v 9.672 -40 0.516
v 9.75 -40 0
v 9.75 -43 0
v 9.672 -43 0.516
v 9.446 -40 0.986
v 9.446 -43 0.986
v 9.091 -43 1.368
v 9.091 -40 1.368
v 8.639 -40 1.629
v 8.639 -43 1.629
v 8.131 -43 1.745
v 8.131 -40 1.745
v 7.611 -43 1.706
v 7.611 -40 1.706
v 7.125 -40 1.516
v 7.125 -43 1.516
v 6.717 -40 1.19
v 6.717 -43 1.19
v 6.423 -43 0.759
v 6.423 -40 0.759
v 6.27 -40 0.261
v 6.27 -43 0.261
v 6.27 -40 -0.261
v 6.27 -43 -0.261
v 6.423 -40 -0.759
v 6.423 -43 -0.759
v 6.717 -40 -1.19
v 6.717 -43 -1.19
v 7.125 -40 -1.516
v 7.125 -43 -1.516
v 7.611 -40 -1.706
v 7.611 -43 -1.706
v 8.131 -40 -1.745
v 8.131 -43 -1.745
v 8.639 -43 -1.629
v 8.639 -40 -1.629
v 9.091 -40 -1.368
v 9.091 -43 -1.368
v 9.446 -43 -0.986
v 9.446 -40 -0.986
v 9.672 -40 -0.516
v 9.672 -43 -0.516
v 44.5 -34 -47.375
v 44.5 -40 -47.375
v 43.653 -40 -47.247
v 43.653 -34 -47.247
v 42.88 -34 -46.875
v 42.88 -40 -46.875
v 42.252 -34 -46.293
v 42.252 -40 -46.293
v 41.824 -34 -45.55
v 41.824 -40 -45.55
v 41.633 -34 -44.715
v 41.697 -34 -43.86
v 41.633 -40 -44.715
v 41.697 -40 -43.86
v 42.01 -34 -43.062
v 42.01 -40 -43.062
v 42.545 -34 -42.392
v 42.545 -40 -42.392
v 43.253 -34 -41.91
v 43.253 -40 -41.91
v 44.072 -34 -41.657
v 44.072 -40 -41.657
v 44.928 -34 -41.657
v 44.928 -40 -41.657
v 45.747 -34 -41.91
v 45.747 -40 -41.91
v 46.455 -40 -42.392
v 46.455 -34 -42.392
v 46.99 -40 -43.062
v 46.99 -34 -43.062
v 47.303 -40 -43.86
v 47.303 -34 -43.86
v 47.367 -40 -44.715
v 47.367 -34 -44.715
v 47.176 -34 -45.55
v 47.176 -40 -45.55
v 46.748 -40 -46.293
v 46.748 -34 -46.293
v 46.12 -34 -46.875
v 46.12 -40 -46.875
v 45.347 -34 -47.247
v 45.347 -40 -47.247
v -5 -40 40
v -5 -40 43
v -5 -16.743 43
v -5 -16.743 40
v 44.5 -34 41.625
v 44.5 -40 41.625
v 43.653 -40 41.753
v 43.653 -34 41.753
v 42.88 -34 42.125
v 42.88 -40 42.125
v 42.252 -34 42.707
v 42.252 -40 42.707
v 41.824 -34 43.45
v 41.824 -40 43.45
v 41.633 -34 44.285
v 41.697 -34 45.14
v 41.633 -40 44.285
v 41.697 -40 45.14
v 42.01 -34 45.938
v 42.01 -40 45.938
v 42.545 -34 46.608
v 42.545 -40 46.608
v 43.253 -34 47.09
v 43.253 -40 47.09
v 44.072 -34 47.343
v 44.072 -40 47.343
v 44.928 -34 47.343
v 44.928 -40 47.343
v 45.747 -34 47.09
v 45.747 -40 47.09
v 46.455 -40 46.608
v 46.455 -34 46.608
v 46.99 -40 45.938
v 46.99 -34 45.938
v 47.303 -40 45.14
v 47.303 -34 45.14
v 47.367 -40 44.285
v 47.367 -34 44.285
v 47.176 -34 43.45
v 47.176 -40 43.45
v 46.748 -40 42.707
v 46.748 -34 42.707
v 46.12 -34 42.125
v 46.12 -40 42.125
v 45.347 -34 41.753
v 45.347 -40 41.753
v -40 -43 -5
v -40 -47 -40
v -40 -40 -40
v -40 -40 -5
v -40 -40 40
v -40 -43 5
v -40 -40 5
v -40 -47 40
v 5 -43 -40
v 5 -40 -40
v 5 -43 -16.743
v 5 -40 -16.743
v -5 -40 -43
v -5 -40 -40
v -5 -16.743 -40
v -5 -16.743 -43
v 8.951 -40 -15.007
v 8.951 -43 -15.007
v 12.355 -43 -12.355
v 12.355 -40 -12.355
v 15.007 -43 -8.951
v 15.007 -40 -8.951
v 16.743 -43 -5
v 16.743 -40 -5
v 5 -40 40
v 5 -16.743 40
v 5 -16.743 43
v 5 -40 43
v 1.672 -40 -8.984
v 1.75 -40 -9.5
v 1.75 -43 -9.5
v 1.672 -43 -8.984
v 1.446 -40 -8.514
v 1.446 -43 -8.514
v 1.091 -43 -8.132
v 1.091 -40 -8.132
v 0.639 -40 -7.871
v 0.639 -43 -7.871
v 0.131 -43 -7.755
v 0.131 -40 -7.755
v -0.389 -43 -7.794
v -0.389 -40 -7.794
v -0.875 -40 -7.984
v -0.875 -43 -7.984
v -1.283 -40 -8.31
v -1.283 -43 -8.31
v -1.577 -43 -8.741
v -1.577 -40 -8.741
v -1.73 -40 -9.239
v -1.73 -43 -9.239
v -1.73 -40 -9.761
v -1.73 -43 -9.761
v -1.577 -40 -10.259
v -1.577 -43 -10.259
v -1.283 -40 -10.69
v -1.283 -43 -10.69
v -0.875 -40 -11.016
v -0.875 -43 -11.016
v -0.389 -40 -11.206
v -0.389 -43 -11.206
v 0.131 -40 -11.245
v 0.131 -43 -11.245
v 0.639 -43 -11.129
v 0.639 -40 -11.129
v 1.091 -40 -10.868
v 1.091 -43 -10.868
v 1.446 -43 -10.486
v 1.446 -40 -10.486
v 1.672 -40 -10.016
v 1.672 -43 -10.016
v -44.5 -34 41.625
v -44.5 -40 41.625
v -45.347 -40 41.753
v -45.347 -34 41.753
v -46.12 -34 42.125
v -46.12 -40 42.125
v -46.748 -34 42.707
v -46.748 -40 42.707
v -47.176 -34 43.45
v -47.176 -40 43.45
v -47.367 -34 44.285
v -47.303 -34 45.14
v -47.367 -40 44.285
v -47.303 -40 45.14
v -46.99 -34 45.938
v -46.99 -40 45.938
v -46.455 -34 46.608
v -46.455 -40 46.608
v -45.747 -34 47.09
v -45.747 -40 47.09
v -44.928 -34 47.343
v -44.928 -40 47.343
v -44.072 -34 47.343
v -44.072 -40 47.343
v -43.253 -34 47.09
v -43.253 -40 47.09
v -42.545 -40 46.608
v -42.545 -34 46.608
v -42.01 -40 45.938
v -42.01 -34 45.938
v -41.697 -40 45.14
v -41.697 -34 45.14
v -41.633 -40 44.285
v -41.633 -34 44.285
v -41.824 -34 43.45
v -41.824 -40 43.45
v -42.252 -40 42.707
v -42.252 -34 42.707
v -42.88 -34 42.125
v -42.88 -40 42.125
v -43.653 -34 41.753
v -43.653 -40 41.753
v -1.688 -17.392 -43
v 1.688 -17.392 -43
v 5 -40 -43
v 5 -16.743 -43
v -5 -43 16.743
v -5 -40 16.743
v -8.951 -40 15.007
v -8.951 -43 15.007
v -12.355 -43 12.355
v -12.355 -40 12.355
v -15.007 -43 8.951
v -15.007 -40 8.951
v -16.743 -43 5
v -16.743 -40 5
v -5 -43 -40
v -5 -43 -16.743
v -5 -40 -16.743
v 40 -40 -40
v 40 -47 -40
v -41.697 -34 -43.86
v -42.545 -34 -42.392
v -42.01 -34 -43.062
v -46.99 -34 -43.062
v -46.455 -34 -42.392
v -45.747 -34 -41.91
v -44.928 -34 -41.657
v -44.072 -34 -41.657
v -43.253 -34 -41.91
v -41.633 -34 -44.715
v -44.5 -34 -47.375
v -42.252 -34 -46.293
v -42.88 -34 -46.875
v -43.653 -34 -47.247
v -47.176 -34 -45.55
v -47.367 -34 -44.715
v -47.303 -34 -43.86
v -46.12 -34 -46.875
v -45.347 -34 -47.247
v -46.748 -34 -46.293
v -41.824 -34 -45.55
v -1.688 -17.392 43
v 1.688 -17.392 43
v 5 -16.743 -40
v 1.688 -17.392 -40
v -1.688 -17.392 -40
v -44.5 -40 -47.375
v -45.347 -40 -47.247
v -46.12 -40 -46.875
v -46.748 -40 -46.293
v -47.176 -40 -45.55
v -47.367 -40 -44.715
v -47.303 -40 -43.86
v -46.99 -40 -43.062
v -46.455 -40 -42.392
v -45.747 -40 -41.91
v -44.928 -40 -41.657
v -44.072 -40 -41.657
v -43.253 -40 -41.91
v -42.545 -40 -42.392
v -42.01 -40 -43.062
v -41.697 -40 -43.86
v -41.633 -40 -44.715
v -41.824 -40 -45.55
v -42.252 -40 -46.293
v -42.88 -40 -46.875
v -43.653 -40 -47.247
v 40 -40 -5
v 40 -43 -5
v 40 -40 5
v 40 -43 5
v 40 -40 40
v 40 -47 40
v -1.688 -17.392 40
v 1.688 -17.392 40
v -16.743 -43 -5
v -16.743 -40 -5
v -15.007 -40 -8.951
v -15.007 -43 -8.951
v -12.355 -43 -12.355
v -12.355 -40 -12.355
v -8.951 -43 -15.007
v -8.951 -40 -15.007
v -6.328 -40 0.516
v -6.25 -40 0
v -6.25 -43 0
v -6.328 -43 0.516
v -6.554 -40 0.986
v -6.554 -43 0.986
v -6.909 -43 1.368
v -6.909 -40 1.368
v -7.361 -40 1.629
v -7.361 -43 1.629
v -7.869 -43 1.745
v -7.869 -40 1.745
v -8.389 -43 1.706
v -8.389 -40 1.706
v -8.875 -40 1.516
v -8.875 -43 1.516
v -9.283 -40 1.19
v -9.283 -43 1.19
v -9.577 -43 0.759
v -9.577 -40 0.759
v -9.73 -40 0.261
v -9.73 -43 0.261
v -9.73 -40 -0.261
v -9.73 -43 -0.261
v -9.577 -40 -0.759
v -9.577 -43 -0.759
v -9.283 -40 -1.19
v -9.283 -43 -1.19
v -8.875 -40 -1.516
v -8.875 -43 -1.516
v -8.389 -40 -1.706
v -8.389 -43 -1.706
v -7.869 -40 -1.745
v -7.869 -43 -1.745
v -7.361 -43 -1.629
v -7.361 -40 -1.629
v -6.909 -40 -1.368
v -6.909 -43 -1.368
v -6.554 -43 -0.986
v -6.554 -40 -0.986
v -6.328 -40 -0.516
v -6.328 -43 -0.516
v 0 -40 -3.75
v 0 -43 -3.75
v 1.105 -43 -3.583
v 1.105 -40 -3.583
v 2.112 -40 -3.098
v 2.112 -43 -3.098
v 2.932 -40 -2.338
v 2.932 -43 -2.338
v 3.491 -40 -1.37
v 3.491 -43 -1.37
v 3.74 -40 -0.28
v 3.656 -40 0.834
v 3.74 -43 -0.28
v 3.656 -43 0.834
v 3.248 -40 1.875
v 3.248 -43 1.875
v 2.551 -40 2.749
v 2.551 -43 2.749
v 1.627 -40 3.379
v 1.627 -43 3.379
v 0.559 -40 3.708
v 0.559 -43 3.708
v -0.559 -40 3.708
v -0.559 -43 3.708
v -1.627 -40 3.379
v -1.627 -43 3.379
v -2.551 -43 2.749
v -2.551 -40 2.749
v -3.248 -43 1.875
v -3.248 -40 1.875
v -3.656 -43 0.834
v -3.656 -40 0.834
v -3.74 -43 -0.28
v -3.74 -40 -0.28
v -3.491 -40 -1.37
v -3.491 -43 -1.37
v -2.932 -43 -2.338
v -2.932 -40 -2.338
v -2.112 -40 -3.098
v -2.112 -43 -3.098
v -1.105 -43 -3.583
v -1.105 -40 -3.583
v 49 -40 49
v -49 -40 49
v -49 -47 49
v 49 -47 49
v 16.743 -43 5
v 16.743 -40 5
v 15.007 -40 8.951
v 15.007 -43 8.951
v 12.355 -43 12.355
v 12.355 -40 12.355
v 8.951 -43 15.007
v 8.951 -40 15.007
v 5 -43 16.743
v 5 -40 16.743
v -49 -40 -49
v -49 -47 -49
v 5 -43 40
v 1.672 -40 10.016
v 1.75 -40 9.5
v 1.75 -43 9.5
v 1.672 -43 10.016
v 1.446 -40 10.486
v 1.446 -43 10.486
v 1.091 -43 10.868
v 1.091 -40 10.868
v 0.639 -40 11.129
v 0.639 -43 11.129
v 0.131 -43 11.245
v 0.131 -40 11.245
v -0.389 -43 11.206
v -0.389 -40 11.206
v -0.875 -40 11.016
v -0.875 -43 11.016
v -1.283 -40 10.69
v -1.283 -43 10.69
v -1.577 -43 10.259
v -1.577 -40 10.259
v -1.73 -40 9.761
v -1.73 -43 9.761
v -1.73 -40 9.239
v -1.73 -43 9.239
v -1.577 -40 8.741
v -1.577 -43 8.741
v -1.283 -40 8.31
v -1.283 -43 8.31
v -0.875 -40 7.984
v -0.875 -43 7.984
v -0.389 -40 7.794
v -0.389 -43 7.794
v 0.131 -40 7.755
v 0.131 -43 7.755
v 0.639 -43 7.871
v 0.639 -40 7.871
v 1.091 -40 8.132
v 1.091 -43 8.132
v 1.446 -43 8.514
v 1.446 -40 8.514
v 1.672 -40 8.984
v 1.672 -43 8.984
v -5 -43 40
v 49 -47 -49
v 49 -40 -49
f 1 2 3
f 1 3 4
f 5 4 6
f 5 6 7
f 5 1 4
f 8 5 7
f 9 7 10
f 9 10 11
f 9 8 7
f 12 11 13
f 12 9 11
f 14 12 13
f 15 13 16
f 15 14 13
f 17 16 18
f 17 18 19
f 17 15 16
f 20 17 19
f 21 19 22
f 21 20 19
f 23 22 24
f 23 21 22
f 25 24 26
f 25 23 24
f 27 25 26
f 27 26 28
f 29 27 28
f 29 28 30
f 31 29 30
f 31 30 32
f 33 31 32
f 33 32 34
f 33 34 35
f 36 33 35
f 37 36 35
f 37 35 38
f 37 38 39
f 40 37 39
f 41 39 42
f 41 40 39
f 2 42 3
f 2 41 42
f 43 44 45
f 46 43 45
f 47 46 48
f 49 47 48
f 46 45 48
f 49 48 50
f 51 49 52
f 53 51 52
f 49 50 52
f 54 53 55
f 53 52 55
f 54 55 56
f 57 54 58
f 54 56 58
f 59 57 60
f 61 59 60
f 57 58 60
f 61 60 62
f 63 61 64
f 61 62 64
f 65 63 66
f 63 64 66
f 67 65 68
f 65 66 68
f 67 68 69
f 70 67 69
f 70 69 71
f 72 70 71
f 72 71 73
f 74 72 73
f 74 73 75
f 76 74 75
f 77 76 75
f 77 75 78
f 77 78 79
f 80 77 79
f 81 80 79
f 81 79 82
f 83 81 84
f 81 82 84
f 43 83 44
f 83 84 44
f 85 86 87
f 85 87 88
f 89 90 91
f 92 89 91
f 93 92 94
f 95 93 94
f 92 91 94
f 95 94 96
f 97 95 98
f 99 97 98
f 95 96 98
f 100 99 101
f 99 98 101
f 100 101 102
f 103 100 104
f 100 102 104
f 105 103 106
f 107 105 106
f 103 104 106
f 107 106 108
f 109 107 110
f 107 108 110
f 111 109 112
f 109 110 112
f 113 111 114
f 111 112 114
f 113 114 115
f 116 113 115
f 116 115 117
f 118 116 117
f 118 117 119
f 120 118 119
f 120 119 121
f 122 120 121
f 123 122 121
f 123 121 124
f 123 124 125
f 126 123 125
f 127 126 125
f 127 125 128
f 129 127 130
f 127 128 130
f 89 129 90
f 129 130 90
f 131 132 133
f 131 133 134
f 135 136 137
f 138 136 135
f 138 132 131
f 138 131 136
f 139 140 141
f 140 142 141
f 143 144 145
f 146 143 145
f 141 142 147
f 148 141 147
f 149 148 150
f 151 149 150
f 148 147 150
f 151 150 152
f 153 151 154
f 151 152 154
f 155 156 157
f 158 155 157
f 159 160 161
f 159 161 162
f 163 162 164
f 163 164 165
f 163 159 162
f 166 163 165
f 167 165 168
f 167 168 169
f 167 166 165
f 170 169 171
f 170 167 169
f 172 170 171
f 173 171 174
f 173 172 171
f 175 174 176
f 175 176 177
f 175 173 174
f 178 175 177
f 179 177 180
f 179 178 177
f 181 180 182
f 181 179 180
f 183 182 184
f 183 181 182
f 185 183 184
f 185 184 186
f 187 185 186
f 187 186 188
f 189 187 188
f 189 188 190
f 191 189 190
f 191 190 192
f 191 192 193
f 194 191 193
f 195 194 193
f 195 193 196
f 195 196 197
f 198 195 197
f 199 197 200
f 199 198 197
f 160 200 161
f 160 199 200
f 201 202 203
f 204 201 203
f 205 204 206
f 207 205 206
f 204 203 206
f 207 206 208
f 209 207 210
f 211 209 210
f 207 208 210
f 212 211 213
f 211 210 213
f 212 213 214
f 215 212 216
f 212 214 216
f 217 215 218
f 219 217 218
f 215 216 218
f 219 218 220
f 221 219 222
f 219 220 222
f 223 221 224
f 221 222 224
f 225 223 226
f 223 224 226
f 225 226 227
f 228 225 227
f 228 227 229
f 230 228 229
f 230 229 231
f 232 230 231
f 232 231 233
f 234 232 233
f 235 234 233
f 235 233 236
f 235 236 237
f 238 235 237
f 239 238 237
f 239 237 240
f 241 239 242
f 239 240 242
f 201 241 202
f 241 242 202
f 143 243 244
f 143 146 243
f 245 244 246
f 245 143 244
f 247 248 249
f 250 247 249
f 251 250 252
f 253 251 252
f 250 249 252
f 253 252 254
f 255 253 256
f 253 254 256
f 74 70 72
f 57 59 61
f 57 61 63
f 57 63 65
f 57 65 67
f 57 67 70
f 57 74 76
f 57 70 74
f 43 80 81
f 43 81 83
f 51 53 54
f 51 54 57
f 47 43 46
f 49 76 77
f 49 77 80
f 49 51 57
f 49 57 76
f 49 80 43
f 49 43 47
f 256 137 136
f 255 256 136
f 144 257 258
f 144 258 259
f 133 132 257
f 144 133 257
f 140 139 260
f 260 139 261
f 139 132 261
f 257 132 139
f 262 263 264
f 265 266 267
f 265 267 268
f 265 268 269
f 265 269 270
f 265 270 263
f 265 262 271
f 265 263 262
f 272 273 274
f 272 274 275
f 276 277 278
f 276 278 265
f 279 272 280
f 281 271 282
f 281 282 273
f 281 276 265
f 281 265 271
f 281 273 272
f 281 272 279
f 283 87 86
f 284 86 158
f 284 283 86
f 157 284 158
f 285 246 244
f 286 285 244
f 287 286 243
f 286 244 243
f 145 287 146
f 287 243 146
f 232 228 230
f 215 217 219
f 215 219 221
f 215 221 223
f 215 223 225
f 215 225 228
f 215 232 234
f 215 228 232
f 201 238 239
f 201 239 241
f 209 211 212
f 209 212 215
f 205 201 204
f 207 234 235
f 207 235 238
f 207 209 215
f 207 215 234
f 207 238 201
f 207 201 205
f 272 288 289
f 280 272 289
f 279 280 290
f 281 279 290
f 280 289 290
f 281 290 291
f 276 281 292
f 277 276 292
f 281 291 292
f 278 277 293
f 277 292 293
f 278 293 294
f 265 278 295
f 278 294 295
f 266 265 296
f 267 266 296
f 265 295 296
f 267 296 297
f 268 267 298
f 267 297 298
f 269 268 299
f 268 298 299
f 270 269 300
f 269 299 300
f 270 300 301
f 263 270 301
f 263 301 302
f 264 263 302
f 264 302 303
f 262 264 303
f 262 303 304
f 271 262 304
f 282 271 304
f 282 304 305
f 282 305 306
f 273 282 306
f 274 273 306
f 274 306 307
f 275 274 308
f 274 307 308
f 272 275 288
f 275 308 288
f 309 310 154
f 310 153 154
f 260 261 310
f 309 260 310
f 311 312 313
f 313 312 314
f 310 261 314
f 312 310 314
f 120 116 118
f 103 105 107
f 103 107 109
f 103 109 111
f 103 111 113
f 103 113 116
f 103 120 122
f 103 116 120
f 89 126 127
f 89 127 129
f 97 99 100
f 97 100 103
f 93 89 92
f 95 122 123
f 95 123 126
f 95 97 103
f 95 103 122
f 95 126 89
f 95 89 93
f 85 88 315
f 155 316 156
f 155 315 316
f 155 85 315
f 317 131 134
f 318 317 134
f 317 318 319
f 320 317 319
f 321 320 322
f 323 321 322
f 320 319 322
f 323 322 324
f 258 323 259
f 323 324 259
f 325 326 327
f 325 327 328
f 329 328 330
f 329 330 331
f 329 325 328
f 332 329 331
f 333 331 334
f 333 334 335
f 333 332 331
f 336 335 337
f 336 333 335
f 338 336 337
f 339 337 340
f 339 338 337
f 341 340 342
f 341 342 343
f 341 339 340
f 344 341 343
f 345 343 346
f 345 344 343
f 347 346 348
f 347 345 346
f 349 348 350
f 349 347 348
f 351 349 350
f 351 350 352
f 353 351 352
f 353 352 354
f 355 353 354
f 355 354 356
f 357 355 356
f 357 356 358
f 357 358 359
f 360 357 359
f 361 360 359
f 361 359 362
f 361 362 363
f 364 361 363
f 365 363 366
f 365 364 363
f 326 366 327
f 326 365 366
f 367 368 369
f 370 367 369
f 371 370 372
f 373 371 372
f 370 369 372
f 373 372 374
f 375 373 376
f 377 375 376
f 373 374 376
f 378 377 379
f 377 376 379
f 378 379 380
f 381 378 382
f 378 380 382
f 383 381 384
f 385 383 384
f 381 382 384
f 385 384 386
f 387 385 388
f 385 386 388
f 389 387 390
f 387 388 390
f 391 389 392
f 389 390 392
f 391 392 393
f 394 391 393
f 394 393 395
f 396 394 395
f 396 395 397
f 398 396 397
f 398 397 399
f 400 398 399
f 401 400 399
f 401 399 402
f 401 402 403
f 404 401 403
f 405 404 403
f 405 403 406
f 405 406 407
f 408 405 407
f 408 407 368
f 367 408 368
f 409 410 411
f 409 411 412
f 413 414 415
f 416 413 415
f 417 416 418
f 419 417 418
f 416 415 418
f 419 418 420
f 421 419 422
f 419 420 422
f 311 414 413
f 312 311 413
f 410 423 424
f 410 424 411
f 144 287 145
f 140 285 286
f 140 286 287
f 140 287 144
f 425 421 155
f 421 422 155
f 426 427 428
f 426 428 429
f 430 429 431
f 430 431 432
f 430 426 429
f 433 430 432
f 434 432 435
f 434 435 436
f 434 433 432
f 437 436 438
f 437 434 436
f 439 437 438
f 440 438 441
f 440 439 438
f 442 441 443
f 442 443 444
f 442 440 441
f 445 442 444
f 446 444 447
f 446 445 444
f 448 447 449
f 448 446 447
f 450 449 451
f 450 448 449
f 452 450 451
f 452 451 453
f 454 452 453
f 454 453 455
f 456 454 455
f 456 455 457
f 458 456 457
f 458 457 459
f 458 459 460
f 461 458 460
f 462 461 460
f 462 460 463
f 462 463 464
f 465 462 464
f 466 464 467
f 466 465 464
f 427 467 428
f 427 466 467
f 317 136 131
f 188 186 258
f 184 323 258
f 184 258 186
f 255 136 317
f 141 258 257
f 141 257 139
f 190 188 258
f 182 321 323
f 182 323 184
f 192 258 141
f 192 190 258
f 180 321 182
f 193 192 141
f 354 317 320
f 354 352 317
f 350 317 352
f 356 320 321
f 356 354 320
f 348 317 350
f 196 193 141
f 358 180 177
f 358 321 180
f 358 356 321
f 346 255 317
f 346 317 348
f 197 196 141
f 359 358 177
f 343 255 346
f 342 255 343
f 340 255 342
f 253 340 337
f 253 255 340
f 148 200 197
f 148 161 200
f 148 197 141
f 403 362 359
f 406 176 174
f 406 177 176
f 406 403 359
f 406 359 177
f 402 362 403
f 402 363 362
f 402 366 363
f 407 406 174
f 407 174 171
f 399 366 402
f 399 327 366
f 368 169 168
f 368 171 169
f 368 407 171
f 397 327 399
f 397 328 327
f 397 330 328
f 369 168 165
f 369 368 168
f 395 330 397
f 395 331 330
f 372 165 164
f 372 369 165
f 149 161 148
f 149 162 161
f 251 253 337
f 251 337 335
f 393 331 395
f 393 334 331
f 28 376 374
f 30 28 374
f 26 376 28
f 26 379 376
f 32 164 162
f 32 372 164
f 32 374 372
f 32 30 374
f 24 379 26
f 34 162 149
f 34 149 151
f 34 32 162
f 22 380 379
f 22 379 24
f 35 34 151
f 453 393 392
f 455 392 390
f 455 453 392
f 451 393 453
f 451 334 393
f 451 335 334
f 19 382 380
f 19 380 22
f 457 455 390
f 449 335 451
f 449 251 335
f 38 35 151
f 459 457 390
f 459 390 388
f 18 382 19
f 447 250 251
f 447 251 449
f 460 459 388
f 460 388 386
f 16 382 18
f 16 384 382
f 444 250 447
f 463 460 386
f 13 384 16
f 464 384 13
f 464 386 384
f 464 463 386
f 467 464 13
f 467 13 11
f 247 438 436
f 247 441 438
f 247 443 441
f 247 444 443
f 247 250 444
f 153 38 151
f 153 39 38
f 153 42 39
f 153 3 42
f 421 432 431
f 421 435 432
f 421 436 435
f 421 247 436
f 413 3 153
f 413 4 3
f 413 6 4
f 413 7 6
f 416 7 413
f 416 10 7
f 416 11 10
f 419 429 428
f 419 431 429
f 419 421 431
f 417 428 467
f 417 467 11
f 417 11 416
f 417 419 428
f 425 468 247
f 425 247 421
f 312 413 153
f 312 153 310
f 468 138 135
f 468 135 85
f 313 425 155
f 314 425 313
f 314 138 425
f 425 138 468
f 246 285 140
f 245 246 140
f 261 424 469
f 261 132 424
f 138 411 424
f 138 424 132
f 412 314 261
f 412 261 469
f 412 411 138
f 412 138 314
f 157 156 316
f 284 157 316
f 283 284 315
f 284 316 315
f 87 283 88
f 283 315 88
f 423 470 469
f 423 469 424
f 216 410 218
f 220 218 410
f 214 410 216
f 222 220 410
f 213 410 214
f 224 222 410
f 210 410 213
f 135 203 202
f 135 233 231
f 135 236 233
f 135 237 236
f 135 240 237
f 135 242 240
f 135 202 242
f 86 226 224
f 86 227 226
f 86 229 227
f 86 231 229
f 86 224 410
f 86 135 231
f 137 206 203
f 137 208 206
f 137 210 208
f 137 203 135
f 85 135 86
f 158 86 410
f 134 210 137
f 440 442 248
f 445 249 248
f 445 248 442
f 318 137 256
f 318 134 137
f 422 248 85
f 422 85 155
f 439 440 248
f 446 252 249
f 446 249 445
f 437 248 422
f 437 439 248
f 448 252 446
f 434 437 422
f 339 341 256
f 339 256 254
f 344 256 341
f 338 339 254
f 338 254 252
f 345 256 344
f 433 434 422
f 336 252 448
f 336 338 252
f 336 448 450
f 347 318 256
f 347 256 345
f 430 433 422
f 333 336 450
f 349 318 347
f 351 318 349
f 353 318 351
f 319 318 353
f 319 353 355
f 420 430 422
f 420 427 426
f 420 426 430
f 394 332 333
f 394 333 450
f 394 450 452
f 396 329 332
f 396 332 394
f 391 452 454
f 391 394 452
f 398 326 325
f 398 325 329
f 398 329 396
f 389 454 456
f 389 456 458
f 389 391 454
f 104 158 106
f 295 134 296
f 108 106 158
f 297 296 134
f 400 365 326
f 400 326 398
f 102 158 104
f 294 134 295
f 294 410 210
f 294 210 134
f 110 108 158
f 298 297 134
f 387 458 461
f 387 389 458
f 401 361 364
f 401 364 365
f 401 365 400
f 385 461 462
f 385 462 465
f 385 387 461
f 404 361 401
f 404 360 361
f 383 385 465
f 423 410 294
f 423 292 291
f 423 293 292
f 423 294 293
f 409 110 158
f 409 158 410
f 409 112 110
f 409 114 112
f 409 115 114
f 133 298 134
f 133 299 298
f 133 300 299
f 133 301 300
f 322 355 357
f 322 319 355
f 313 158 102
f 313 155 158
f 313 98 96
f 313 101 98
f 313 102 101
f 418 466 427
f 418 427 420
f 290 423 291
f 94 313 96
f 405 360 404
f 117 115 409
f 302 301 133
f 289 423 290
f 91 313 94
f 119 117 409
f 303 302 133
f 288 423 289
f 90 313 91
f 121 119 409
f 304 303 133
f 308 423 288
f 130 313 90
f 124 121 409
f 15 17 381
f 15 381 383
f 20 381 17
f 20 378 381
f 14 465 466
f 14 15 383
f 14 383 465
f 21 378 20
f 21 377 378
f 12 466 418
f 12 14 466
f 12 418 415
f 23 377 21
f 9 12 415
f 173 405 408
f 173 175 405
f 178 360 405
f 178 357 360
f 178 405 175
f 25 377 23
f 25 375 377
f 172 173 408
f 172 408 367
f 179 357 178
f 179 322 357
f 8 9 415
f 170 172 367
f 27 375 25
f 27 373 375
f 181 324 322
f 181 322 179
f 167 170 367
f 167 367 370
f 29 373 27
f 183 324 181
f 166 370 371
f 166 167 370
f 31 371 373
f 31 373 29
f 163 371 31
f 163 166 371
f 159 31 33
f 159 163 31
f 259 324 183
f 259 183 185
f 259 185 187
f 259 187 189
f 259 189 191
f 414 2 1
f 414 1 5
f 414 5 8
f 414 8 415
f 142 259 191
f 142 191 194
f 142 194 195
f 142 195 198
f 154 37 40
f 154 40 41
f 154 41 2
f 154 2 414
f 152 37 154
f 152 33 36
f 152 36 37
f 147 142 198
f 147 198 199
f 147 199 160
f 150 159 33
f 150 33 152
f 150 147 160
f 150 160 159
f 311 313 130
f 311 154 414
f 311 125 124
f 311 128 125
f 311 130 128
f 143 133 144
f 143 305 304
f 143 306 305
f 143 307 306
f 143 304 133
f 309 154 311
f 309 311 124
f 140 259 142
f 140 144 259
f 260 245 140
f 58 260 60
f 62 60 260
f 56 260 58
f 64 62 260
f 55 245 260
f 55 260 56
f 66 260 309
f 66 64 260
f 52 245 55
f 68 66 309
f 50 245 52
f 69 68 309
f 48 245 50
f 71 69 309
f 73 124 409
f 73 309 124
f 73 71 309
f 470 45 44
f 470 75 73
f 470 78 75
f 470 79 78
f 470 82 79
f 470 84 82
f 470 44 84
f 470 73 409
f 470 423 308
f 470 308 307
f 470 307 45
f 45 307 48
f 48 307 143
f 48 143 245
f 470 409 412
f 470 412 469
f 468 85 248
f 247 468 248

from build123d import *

# Parameters (mm, degrees)
SKETCH2_R                  = 1.75
SKETCH2_W                  = 10
SKETCH2_H                  = 10
BOSS_EXTRUDE1_DEPTH        = 3
CIRPATTERN1_COUNT          = 4
CIRPATTERN2_START          = 40
CIRPATTERN2_OUTLINE_R      = 1.75
CIRPATTERN2_DEPTH          = 3
CIRPATTERN2_START_2        = -43
CIRPATTERN2_2_OUTLINE_R    = 1.75
CIRPATTERN2_2_DEPTH        = 3
CIRPATTERN2_3_OUTLINE_R    = 1.75
CIRPATTERN2_3_DEPTH        = 3
CIRPATTERN2_4_OUTLINE_R    = 1.75
CIRPATTERN2_4_DEPTH        = 3
BOSS_EXTRUDE2_DEPTH        = 50
BOSS_EXTRUDE2_DEPTH_BACK   = 50
SKETCH3_W                  = 10
SKETCH3_H                  = 10
BOSS_EXTRUDE2_2_DEPTH      = 50
BOSS_EXTRUDE2_2_DEPTH_BACK = 50
BOSS_EXTRUDE2_3_DEPTH      = 50
BOSS_EXTRUDE2_3_DEPTH_BACK = 50
BOSS_EXTRUDE2_4_DEPTH      = 50
BOSS_EXTRUDE2_4_DEPTH_BACK = 50
SKETCH4_W                  = 100
SKETCH4_H                  = 100
SKETCH4_W_2                = 80
SKETCH4_H_2                = 80
BOSS_EXTRUDE3_DEPTH        = 10
SKETCH5_W                  = 100
SKETCH5_H                  = 100
SKETCH5_W_2                = 80
SKETCH5_H_2                = 80
BOSS_EXTRUDE4_DEPTH        = 5
CUT_EXTRUDE1_START         = -100
CUT_EXTRUDE1_DEPTH         = 100
CUT_EXTRUDE1_START_2       = -55
CUT_EXTRUDE1_2_OUTLINE_W   = 10
CUT_EXTRUDE1_2_OUTLINE_H   = 3
CUT_EXTRUDE1_2_DEPTH       = 10
CUT_EXTRUDE1_3_OUTLINE_W   = 90
CUT_EXTRUDE1_3_OUTLINE_H   = 3
CUT_EXTRUDE1_3_DEPTH       = 100
SKETCH7_R                  = 3.75
CUT_EXTRUDE2_DEPTH         = 10
SKETCH8_R                  = 3.75
CUT_EXTRUDE3_DEPTH         = 117.828934772
SKETCH9_R                  = 3.75
CUT_EXTRUDE4_DEPTH         = 117.828934772
SKETCH10_W                 = 100
SKETCH10_H                 = 100
CUT_EXTRUDE5_DEPTH         = 3
CUT_EXTRUDE6_DEPTH         = 1
SKETCH12_W                 = 99
SKETCH12_H                 = 97
CUT_EXTRUDE7_DEPTH         = 1
CUT_EXTRUDE8_DEPTH         = 1
SKETCH14_W                 = 98
SKETCH14_H                 = 97
CUT_EXTRUDE9_DEPTH         = 1
CUT_EXTRUDE10_DEPTH        = 117.404467268
CUT_EXTRUDE10_DEPTH_BACK   = 117.404467268
SKETCH15_W                 = 9
SKETCH15_H                 = 5
SKETCH16_R                 = 3.125
CUT_EXTRUDE11_DEPTH        = 8
SKETCH18_W                 = 98
SKETCH18_H                 = 98
SKETCH18_W_2               = 33.4851887
SKETCH18_H_2               = 3
CUT_EXTRUDE12_DEPTH        = 85
SKETCH20_R                 = 2.875
BOSS_EXTRUDE5_DEPTH        = 6
SKETCH21_R                 = 1.75
SKETCH21_R_2               = 3.75
CUT_EXTRUDE13_DEPTH        = 115.341593482


with BuildPart() as part:
    # Sketch2 → Boss-Extrude1 (new body)
    # profile 1 of 13: a face of its own
    with BuildSketch(Plane.XY.offset(40)):
        with BuildLine():
            ThreePointArc((5, -16.74259435), (0, -17.47325), (-5, -16.74259435))
            Line((-5, -16.74259435), (-5, -50))
            Line((-5, -50), (5, -50))
            Line((5, -50), (5, -16.74259435))
        make_face()
    # profile 2 of 13: a face of its own
    with BuildSketch(Plane.XY.offset(40)):
        with BuildLine():
            Line((5, -5), (-5, -5))
            Line((-5, -5), (-5, -16.74259435))
            ThreePointArc((-5, -16.74259435), (0, -17.47325), (5, -16.74259435))
            Line((5, -16.74259435), (5, -5))
        make_face()
        with Locations((0, -9.5)):
            Circle(SKETCH2_R, mode=Mode.SUBTRACT)
    # profile 3 of 13: a face of its own
    with BuildSketch(Plane.XY.offset(40)):
        with BuildLine():
            Line((16.74259435, -5), (5, -5))
            Line((5, -5), (5, -16.74259435))
            ThreePointArc((5, -16.74259435), (12.355453564, -12.355453564), (16.74259435, -5))
        make_face()
    # profile 4 of 13: a face of its own
    with BuildSketch(Plane.XY.offset(40)):
        with BuildLine():
            Line((5, 5), (5, -5))
            Line((5, -5), (16.74259435, -5))
            ThreePointArc((16.74259435, -5), (17.289621197, -2.526551883), (17.47325, 0))
            ThreePointArc((17.47325, 0), (17.289621197, 2.526551883), (16.74259435, 5))
            Line((16.74259435, 5), (5, 5))
        make_face()
        with Locations((8, 0)):
            Circle(SKETCH2_R, mode=Mode.SUBTRACT)
    # profile 5 of 13: a face of its own
    with BuildSketch(Plane.XY.offset(40)):
        Rectangle(SKETCH2_W, SKETCH2_H)
    # profile 6 of 13: a face of its own
    with BuildSketch(Plane.XY.offset(40)):
        with BuildLine():
            Line((-5, -5), (-16.74259435, -5))
            ThreePointArc((-16.74259435, -5), (-12.355453564, -12.355453564), (-5, -16.74259435))
            Line((-5, -16.74259435), (-5, -5))
        make_face()
    # profile 7 of 13: a face of its own
    with BuildSketch(Plane.XY.offset(40)):
        with BuildLine():
            ThreePointArc((-16.74259435, 5), (-17.47325, 0), (-16.74259435, -5))
            Line((-16.74259435, -5), (-5, -5))
            Line((-5, -5), (-5, 5))
            Line((-5, 5), (-16.74259435, 5))
        make_face()
        with Locations((-8, 0)):
            Circle(SKETCH2_R, mode=Mode.SUBTRACT)
    # profile 8 of 13: a face of its own
    with BuildSketch(Plane.XY.offset(40)):
        with BuildLine():
            ThreePointArc((-5, 16.74259435), (-12.355453564, 12.355453564), (-16.74259435, 5))
            Line((-16.74259435, 5), (-5, 5))
            Line((-5, 5), (-5, 16.74259435))
        make_face()
    # profile 9 of 13: a face of its own
    with BuildSketch(Plane.XY.offset(40)):
        with BuildLine():
            Line((-5, 16.74259435), (-5, 5))
            Line((-5, 5), (5, 5))
            Line((5, 5), (5, 16.74259435))
            ThreePointArc((5, 16.74259435), (0, 17.47325), (-5, 16.74259435))
        make_face()
        with Locations((0, 9.5)):
            Circle(SKETCH2_R, mode=Mode.SUBTRACT)
    # profile 10 of 13: a face of its own
    with BuildSketch(Plane.XY.offset(40)):
        with BuildLine():
            Line((5, 16.74259435), (5, 5))
            Line((5, 5), (16.74259435, 5))
            ThreePointArc((16.74259435, 5), (12.355453564, 12.355453564), (5, 16.74259435))
        make_face()
    # profile 11 of 13: a face of its own
    with BuildSketch(Plane.XY.offset(40)):
        with BuildLine():
            ThreePointArc((17.47325, 0), (17.289621197, -2.526551883), (16.74259435, -5))
            Line((16.74259435, -5), (50, -5))
            Line((50, -5), (50, 5))
            Line((50, 5), (16.74259435, 5))
            ThreePointArc((16.74259435, 5), (17.289621197, 2.526551883), (17.47325, 0))
        make_face()
    # profile 12 of 13: a face of its own
    with BuildSketch(Plane.XY.offset(40)):
        with BuildLine():
            Line((-50, 5), (-50, -5))
            Line((-50, -5), (-16.74259435, -5))
            ThreePointArc((-16.74259435, -5), (-17.47325, 0), (-16.74259435, 5))
            Line((-16.74259435, 5), (-50, 5))
        make_face()
    # profile 13 of 13: a face of its own
    with BuildSketch(Plane.XY.offset(40)):
        with BuildLine():
            Line((-5, 50), (-5, 16.74259435))
            ThreePointArc((-5, 16.74259435), (0, 17.47325), (5, 16.74259435))
            Line((5, 16.74259435), (5, 50))
            Line((5, 50), (-5, 50))
        make_face()
    extrude(amount=BOSS_EXTRUDE1_DEPTH)


with BuildPart() as cirpattern1_1:
    # CirPattern1: pattern copy
    add(part.part.rotate(Axis((0, 0, 0), (1, 0, 0)), 1 * 360 / CIRPATTERN1_COUNT))


with BuildPart() as cirpattern1_2:
    # CirPattern1: pattern copy
    add(part.part.rotate(Axis((0, 0, 0), (1, 0, 0)), 2 * 360 / CIRPATTERN1_COUNT))


with BuildPart() as cirpattern1_3:
    # CirPattern1: pattern copy
    add(part.part.rotate(Axis((0, 0, 0), (1, 0, 0)), 3 * 360 / CIRPATTERN1_COUNT))

    # Cut-Extrude1 3 outline → Cut-Extrude1 3 (cut)
    with BuildSketch(Plane.ZY.offset(50).offset(CUT_EXTRUDE1_START)):
        with Locations((5, 41.5)):
            Rectangle(CUT_EXTRUDE1_3_OUTLINE_W, CUT_EXTRUDE1_3_OUTLINE_H)
    extrude(amount=CUT_EXTRUDE1_3_DEPTH, mode=Mode.SUBTRACT)


with BuildPart() as body_5:
    # CirPattern2: read off the stored shape, not the designer's step
    # CirPattern2 outline → CirPattern2 (new body)
    with BuildSketch(Plane.XY.offset(CIRPATTERN2_START)):
        with BuildLine():
            ThreePointArc((5, -16.74259435), (12.355453564, -12.355453564), (16.74259435, -5))
            Line((16.74259435, -5), (50, -5))
            Line((50, -5), (50, 5))
            Line((50, 5), (16.74259435, 5))
            ThreePointArc((16.74259435, 5), (12.355453564, 12.355453564), (5, 16.74259435))
            Line((5, 16.74259435), (5, 50))
            Line((5, 50), (-5, 50))
            Line((-5, 50), (-5, 16.74259435))
            ThreePointArc((-5, 16.74259435), (-12.355453564, 12.355453564), (-16.74259435, 5))
            Line((-16.74259435, 5), (-50, 5))
            Line((-50, 5), (-50, -5))
            Line((-50, -5), (-16.74259435, -5))
            ThreePointArc((-16.74259435, -5), (-12.355453564, -12.355453564), (-5, -16.74259435))
            Line((-5, -16.74259435), (-5, -50))
            Line((-5, -50), (5, -50))
            Line((5, -50), (5, -16.74259435))
        make_face()
        with Locations((0, -9.5)):
            Circle(CIRPATTERN2_OUTLINE_R, mode=Mode.SUBTRACT)
        with Locations((-8, 0)):
            Circle(CIRPATTERN2_OUTLINE_R, mode=Mode.SUBTRACT)
        with Locations((8, 0)):
            Circle(CIRPATTERN2_OUTLINE_R, mode=Mode.SUBTRACT)
        with Locations((0, 9.5)):
            Circle(CIRPATTERN2_OUTLINE_R, mode=Mode.SUBTRACT)
    extrude(amount=CIRPATTERN2_DEPTH)


with BuildPart() as body_6:
    # CirPattern2 2 outline → CirPattern2 2 (new body)
    with BuildSketch(Plane.YZ.offset(CIRPATTERN2_START_2)):
        with BuildLine():
            Line((-5, 50), (-5, 16.74259435))
            ThreePointArc((-5, 16.74259435), (-12.355453564, 12.355453564), (-16.74259435, 5))
            Line((-16.74259435, 5), (-50, 5))
            Line((-50, 5), (-50, -5))
            Line((-50, -5), (-16.74259435, -5))
            ThreePointArc((-16.74259435, -5), (-12.355453564, -12.355453564), (-5, -16.74259435))
            Line((-5, -16.74259435), (-5, -50))
            Line((-5, -50), (5, -50))
            Line((5, -50), (5, -16.74259435))
            ThreePointArc((5, -16.74259435), (12.355453564, -12.355453564), (16.74259435, -5))
            Line((16.74259435, -5), (50, -5))
            Line((50, -5), (50, 5))
            Line((50, 5), (16.74259435, 5))
            ThreePointArc((16.74259435, 5), (12.355453564, 12.355453564), (5, 16.74259435))
            Line((5, 16.74259435), (5, 50))
            Line((5, 50), (-5, 50))
        make_face()
        with Locations((0, -8)):
            Circle(CIRPATTERN2_2_OUTLINE_R, mode=Mode.SUBTRACT)
        with Locations((-9.5, 0)):
            Circle(CIRPATTERN2_2_OUTLINE_R, mode=Mode.SUBTRACT)
        with Locations((9.5, 0)):
            Circle(CIRPATTERN2_2_OUTLINE_R, mode=Mode.SUBTRACT)
        with Locations((0, 8)):
            Circle(CIRPATTERN2_2_OUTLINE_R, mode=Mode.SUBTRACT)
    extrude(amount=CIRPATTERN2_2_DEPTH)


with BuildPart() as body_7:
    # CirPattern2 3 outline → CirPattern2 3 (new body)
    with BuildSketch(Plane.YZ.offset(CIRPATTERN2_START)):
        with BuildLine():
            ThreePointArc((-16.74259435, -5), (-12.355453564, -12.355453564), (-5, -16.74259435))
            Line((-5, -16.74259435), (-5, -50))
            Line((-5, -50), (5, -50))
            Line((5, -50), (5, -16.74259435))
            ThreePointArc((5, -16.74259435), (12.355453564, -12.355453564), (16.74259435, -5))
            Line((16.74259435, -5), (50, -5))
            Line((50, -5), (50, 5))
            Line((50, 5), (16.74259435, 5))
            ThreePointArc((16.74259435, 5), (12.355453564, 12.355453564), (5, 16.74259435))
            Line((5, 16.74259435), (5, 50))
            Line((5, 50), (-5, 50))
            Line((-5, 50), (-5, 16.74259435))
            ThreePointArc((-5, 16.74259435), (-12.355453564, 12.355453564), (-16.74259435, 5))
            Line((-16.74259435, 5), (-50, 5))
            Line((-50, 5), (-50, -5))
            Line((-50, -5), (-16.74259435, -5))
        make_face()
        with Locations((0, -8)):
            Circle(CIRPATTERN2_3_OUTLINE_R, mode=Mode.SUBTRACT)
        with Locations((-9.5, 0)):
            Circle(CIRPATTERN2_3_OUTLINE_R, mode=Mode.SUBTRACT)
        with Locations((9.5, 0)):
            Circle(CIRPATTERN2_3_OUTLINE_R, mode=Mode.SUBTRACT)
        with Locations((0, 8)):
            Circle(CIRPATTERN2_3_OUTLINE_R, mode=Mode.SUBTRACT)
    extrude(amount=CIRPATTERN2_3_DEPTH)


with BuildPart() as body_8:
    # CirPattern2 4 outline → CirPattern2 4 (new body)
    with BuildSketch(Plane.XY.offset(CIRPATTERN2_START_2)):
        with BuildLine():
            Line((50, 5), (16.74259435, 5))
            ThreePointArc((16.74259435, 5), (12.355453564, 12.355453564), (5, 16.74259435))
            Line((5, 16.74259435), (5, 50))
            Line((5, 50), (-5, 50))
            Line((-5, 50), (-5, 16.74259435))
            ThreePointArc((-5, 16.74259435), (-12.355453564, 12.355453564), (-16.74259435, 5))
            Line((-16.74259435, 5), (-50, 5))
            Line((-50, 5), (-50, -5))
            Line((-50, -5), (-16.74259435, -5))
            ThreePointArc((-16.74259435, -5), (-12.355453564, -12.355453564), (-5, -16.74259435))
            Line((-5, -16.74259435), (-5, -50))
            Line((-5, -50), (5, -50))
            Line((5, -50), (5, -16.74259435))
            ThreePointArc((5, -16.74259435), (12.355453564, -12.355453564), (16.74259435, -5))
            Line((16.74259435, -5), (50, -5))
            Line((50, -5), (50, 5))
        make_face()
        with Locations((0, -9.5)):
            Circle(CIRPATTERN2_4_OUTLINE_R, mode=Mode.SUBTRACT)
        with Locations((-8, 0)):
            Circle(CIRPATTERN2_4_OUTLINE_R, mode=Mode.SUBTRACT)
        with Locations((8, 0)):
            Circle(CIRPATTERN2_4_OUTLINE_R, mode=Mode.SUBTRACT)
        with Locations((0, 9.5)):
            Circle(CIRPATTERN2_4_OUTLINE_R, mode=Mode.SUBTRACT)
    extrude(amount=CIRPATTERN2_4_DEPTH)


with BuildPart() as body_9:
    # Sketch3 → Boss-Extrude2 (new, two sides: drawn at the far end of the back side and taken through both)
    with BuildSketch(Plane(origin=(0, 0, 0), x_dir=(1, 0, 0), z_dir=(0, 1, 0)).offset(-BOSS_EXTRUDE2_DEPTH_BACK)):
        with Locations((-45, -45)):
            Rectangle(SKETCH3_W, SKETCH3_H)
    extrude(amount=BOSS_EXTRUDE2_DEPTH + BOSS_EXTRUDE2_DEPTH_BACK)


with BuildPart() as body_10:
    # Sketch3 → Boss-Extrude2 2 (new, two sides: drawn at the far end of the back side and taken through both)
    with BuildSketch(Plane(origin=(0, 0, 0), x_dir=(1, 0, 0), z_dir=(0, 1, 0)).offset(-BOSS_EXTRUDE2_2_DEPTH_BACK)):
        with Locations((45, -45)):
            Rectangle(SKETCH3_W, SKETCH3_H)
    extrude(amount=BOSS_EXTRUDE2_2_DEPTH + BOSS_EXTRUDE2_2_DEPTH_BACK)


with BuildPart() as body_11:
    # Sketch3 → Boss-Extrude2 3 (new, two sides: drawn at the far end of the back side and taken through both)
    with BuildSketch(Plane(origin=(0, 0, 0), x_dir=(1, 0, 0), z_dir=(0, 1, 0)).offset(-BOSS_EXTRUDE2_3_DEPTH_BACK)):
        with Locations((45, 45)):
            Rectangle(SKETCH3_W, SKETCH3_H)
    extrude(amount=BOSS_EXTRUDE2_3_DEPTH + BOSS_EXTRUDE2_3_DEPTH_BACK)


with BuildPart() as body_12:
    # Sketch3 → Boss-Extrude2 4 (new, two sides: drawn at the far end of the back side and taken through both)
    with BuildSketch(Plane(origin=(0, 0, 0), x_dir=(1, 0, 0), z_dir=(0, 1, 0)).offset(-BOSS_EXTRUDE2_4_DEPTH_BACK)):
        with Locations((-45, 45)):
            Rectangle(SKETCH3_W, SKETCH3_H)
    extrude(amount=BOSS_EXTRUDE2_4_DEPTH + BOSS_EXTRUDE2_4_DEPTH_BACK)


with BuildPart() as part_1:
    add(part.part)

    add(cirpattern1_1.part)  # Boss-Extrude3 merges CirPattern1_1

    add(cirpattern1_2.part)  # Boss-Extrude3 merges CirPattern1_2

    add(body_5.part)  # Boss-Extrude3 merges body 5

    add(body_6.part)  # Boss-Extrude3 merges body 6

    add(body_7.part)  # Boss-Extrude3 merges body 7

    add(body_8.part)  # Boss-Extrude3 merges body 8

    add(body_9.part)  # Boss-Extrude3 merges body 9

    add(body_10.part)  # Boss-Extrude3 merges body 10

    add(body_11.part)  # Boss-Extrude3 merges body 11

    add(body_12.part)  # Boss-Extrude3 merges body 12
    # Sketch4 → Boss-Extrude3 (add)
    with BuildSketch(Plane.XZ.offset(50)):
        Rectangle(SKETCH4_W, SKETCH4_H)
        Rectangle(SKETCH4_W_2, SKETCH4_H_2, mode=Mode.SUBTRACT)
    extrude(amount=-BOSS_EXTRUDE3_DEPTH)

    # Sketch5 → Boss-Extrude4 (add)
    with BuildSketch(Plane(origin=(0, 50, 0), x_dir=(1, 0, 0), z_dir=(0, 1, 0))):
        Rectangle(SKETCH5_W, SKETCH5_H)
        Rectangle(SKETCH5_W_2, SKETCH5_H_2, mode=Mode.SUBTRACT)
    extrude(amount=-BOSS_EXTRUDE4_DEPTH)

    # Cut-Extrude1: read off the stored shape, not the designer's step
    # Cut-Extrude1 outline → Cut-Extrude1 (cut)
    with BuildSketch(Plane.ZY.offset(50).offset(CUT_EXTRUDE1_START)):
        with BuildLine():
            Line((40, 50), (-40, 50))
            Line((-40, 50), (-40, 45))
            Line((-40, 45), (-5, 45))
            Line((-5, 45), (-5, 16.74259435))
            ThreePointArc((-5, 16.74259435), (0, 17.47325), (5, 16.74259435))
            Line((5, 16.74259435), (5, 45))
            Line((5, 45), (40, 45))
            Line((40, 45), (40, 50))
        make_face()
    extrude(amount=CUT_EXTRUDE1_DEPTH, mode=Mode.SUBTRACT)

    # Sketch7 → Cut-Extrude2 (cut)
    with BuildSketch(Plane.XZ.offset(43)):
        with Locations(Location((0, 0, 0), (0, 0, 270))):
            Circle(SKETCH7_R)
    extrude(amount=-CUT_EXTRUDE2_DEPTH, mode=Mode.SUBTRACT)

    # Sketch8 → Cut-Extrude3 (cut, through all)
    with BuildSketch(Plane.ZY.offset(43)):
        Circle(SKETCH8_R)
    extrude(amount=-CUT_EXTRUDE3_DEPTH, mode=Mode.SUBTRACT)

    # Sketch9 → Cut-Extrude4 (cut, through all)
    with BuildSketch(Plane(origin=(0, 0, -43), x_dir=(-1, 0, 0), z_dir=(0, 0, -1))):
        Circle(SKETCH9_R)
    extrude(amount=-CUT_EXTRUDE4_DEPTH, mode=Mode.SUBTRACT)

    # Sketch10 → Cut-Extrude5 (cut)
    with BuildSketch(Plane.XZ.offset(50)):
        Rectangle(SKETCH10_W, SKETCH10_H)
    extrude(amount=-CUT_EXTRUDE5_DEPTH, mode=Mode.SUBTRACT)

    # Sketch11 → Cut-Extrude6 (cut)
    with BuildSketch(Plane.ZY.offset(50)):
        Polygon((50, 50), (40, 50), (40, -40), (-40, -40), (-40, 50), (-50, 50), (-50, -47), (50, -47), align=None)
    extrude(amount=-CUT_EXTRUDE6_DEPTH, mode=Mode.SUBTRACT)

    # Sketch12 → Cut-Extrude7 (cut)
    with BuildSketch(Plane.XY.offset(50)):
        with Locations((0.5, 1.5)):
            Rectangle(SKETCH12_W, SKETCH12_H)
    extrude(amount=-CUT_EXTRUDE7_DEPTH, mode=Mode.SUBTRACT)

    # Sketch13 → Cut-Extrude8 (cut)
    with BuildSketch(Plane(origin=(50, 0, 0), x_dir=(0, 0, -1), z_dir=(1, 0, 0))):
        Polygon((50, 50), (40, 50), (40, -40), (-40, -40), (-40, 50), (-49, 50), (-49, -47), (50, -47), align=None)
    extrude(amount=-CUT_EXTRUDE8_DEPTH, mode=Mode.SUBTRACT)

    # Sketch14 → Cut-Extrude9 (cut)
    with BuildSketch(Plane(origin=(0, 0, -50), x_dir=(-1, 0, 0), z_dir=(0, 0, -1))):
        with Locations((0, 1.5)):
            Rectangle(SKETCH14_W, SKETCH14_H)
    extrude(amount=-CUT_EXTRUDE9_DEPTH, mode=Mode.SUBTRACT)


with BuildPart() as body_3:
    # Cut-Extrude1 2 outline → Cut-Extrude1 2 (new body)
    with BuildSketch(Plane.ZY.offset(50).offset(CUT_EXTRUDE1_START_2)):
        with Locations((45, 41.5)):
            Rectangle(CUT_EXTRUDE1_2_OUTLINE_W, CUT_EXTRUDE1_2_OUTLINE_H)
    extrude(amount=CUT_EXTRUDE1_2_DEPTH)


with BuildPart() as cut_extrude10_tool:
    # Sketch15 → Cut-Extrude10 (new, two sides: drawn at the far end of the back side and taken through both)
    with BuildSketch(Plane.XY.offset(43).offset(-CUT_EXTRUDE10_DEPTH_BACK)):
        with Locations((-44.5, 47.5)):
            Rectangle(SKETCH15_W, SKETCH15_H)
        Polygon((-40, 50), (-40, 45), (-5, 45), (5, 45), (40, 45), (40, 50), align=None)
        with Locations((44.5, 47.5)):
            Rectangle(SKETCH15_W, SKETCH15_H)
        with BuildLine():
            Line((5, 45), (-5, 45))
            Line((-5, 45), (-5, 16.74259435))
            ThreePointArc((-5, 16.74259435), (0, 17.47325), (5, 16.74259435))
            Line((5, 16.74259435), (5, 45))
        make_face()
    extrude(amount=CUT_EXTRUDE10_DEPTH + CUT_EXTRUDE10_DEPTH_BACK)


with BuildPart() as part_2:
    add(part_1.part)

    # Cut-Extrude10: cut by cut_extrude10_tool
    add(cut_extrude10_tool.part, mode=Mode.SUBTRACT)

    # Sketch16 → Cut-Extrude11 (cut)
    with BuildSketch(Plane(origin=(0, 45, 0), x_dir=(1, 0, 0), z_dir=(0, 1, 0))):
        with Locations(Location((-44.5, -44.5, 0), (0, 0, 270))):
            Circle(SKETCH16_R)
        with Locations(Location((44.5, -44.5, 0), (0, 0, 90))):
            Circle(SKETCH16_R)
        with Locations(Location((44.5, 44.5, 0), (0, 0, 270))):
            Circle(SKETCH16_R)
        with Locations(Location((-44.5, 44.5, 0), (0, 0, 90))):
            Circle(SKETCH16_R)
    extrude(amount=-CUT_EXTRUDE11_DEPTH, mode=Mode.SUBTRACT)

    # Sketch18 → Cut-Extrude12 (cut)
    with BuildSketch(Plane(origin=(0, 45, 0), x_dir=(1, 0, 0), z_dir=(0, 1, 0))):
        Rectangle(SKETCH18_W, SKETCH18_H)
        with Locations((0, 41.5)):
            Rectangle(SKETCH18_W_2, SKETCH18_H_2, mode=Mode.SUBTRACT)
        with Locations((0, -41.5)):
            Rectangle(SKETCH18_W_2, SKETCH18_H_2, mode=Mode.SUBTRACT)
    extrude(amount=-CUT_EXTRUDE12_DEPTH, mode=Mode.SUBTRACT)

    # Sketch20 → Boss-Extrude5 (add)
    with BuildSketch(Plane(origin=(0, -40, 0), x_dir=(1, 0, 0), z_dir=(0, 1, 0))):
        with Locations(Location((44.5, 44.5, 0), (0, 0, 90))):
            Circle(SKETCH20_R)
        with Locations(Location((44.5, -44.5, 0), (0, 0, 90))):
            Circle(SKETCH20_R)
        with Locations(Location((-44.5, -44.5, 0), (0, 0, 90))):
            Circle(SKETCH20_R)
        with Locations(Location((-44.5, 44.5, 0), (0, 0, 90))):
            Circle(SKETCH20_R)
    extrude(amount=BOSS_EXTRUDE5_DEPTH)

    # Sketch21 → Cut-Extrude13 (cut, through all)
    with BuildSketch(Plane(origin=(0, 0, -43), x_dir=(-1, 0, 0), z_dir=(0, 0, -1))):
        with BuildLine():
            ThreePointArc((5, -16.74259435), (12.355453564, -12.355453564), (16.74259435, -5))
            Line((16.74259435, -5), (16.74259435, 5))
            ThreePointArc((16.74259435, 5), (0, 17.47325), (-16.74259435, 5))
            Line((-16.74259435, 5), (-16.74259435, -5))
            ThreePointArc((-16.74259435, -5), (-12.355453564, -12.355453564), (-5, -16.74259435))
            ThreePointArc((-5, -16.74259435), (0, -17.47325), (5, -16.74259435))
        make_face()
        with Locations((-8, 0)):
            Circle(SKETCH21_R, mode=Mode.SUBTRACT)
        with Locations((0, -9.5)):
            Circle(SKETCH21_R, mode=Mode.SUBTRACT)
        Circle(SKETCH21_R_2, mode=Mode.SUBTRACT)
        with Locations((8, 0)):
            Circle(SKETCH21_R, mode=Mode.SUBTRACT)
        with Locations((0, 9.5)):
            Circle(SKETCH21_R, mode=Mode.SUBTRACT)
    extrude(amount=-CUT_EXTRUDE13_DEPTH, mode=Mode.SUBTRACT)


with BuildPart() as cirpattern1_3_1:
    add(cirpattern1_3.part)

    # Cut-Extrude10: cut by cut_extrude10_tool
    add(cut_extrude10_tool.part, mode=Mode.SUBTRACT)


with BuildPart() as body_3_1:
    add(body_3.part)

    # Cut-Extrude10: cut by cut_extrude10_tool
    add(cut_extrude10_tool.part, mode=Mode.SUBTRACT)


solid = part_2.part
